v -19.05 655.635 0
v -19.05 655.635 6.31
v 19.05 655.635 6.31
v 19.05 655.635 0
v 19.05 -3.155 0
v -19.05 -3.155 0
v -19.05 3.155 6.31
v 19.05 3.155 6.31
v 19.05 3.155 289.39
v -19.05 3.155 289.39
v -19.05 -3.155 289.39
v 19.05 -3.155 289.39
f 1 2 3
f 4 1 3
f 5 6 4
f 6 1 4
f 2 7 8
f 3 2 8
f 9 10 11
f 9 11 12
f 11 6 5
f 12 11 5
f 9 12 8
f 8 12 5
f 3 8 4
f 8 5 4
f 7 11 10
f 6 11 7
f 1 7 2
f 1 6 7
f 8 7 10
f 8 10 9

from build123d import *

# Parameters (mm, degrees)
CROQUIS1_W              = 38.1
CROQUIS1_H              = 6.31
SALIENTE_EXTRUIR1_DEPTH = 289.39
CROQUIS3_W              = 38.1
CROQUIS3_H              = 6.31
SALIENTE_EXTRUIR2_DEPTH = 658.79


with BuildPart() as part:
    # Croquis1 → Saliente-Extruir1 (new body)
    with BuildSketch(Plane.XY):
        Rectangle(CROQUIS1_W, CROQUIS1_H)
    extrude(amount=SALIENTE_EXTRUIR1_DEPTH)

    # Croquis3 → Saliente-Extruir2 (add)
    with BuildSketch(Plane.XZ.offset(3.155)):
        with Locations((0, 3.155)):
            Rectangle(CROQUIS3_W, CROQUIS3_H)
    extrude(amount=-SALIENTE_EXTRUIR2_DEPTH)


solid = part.part
